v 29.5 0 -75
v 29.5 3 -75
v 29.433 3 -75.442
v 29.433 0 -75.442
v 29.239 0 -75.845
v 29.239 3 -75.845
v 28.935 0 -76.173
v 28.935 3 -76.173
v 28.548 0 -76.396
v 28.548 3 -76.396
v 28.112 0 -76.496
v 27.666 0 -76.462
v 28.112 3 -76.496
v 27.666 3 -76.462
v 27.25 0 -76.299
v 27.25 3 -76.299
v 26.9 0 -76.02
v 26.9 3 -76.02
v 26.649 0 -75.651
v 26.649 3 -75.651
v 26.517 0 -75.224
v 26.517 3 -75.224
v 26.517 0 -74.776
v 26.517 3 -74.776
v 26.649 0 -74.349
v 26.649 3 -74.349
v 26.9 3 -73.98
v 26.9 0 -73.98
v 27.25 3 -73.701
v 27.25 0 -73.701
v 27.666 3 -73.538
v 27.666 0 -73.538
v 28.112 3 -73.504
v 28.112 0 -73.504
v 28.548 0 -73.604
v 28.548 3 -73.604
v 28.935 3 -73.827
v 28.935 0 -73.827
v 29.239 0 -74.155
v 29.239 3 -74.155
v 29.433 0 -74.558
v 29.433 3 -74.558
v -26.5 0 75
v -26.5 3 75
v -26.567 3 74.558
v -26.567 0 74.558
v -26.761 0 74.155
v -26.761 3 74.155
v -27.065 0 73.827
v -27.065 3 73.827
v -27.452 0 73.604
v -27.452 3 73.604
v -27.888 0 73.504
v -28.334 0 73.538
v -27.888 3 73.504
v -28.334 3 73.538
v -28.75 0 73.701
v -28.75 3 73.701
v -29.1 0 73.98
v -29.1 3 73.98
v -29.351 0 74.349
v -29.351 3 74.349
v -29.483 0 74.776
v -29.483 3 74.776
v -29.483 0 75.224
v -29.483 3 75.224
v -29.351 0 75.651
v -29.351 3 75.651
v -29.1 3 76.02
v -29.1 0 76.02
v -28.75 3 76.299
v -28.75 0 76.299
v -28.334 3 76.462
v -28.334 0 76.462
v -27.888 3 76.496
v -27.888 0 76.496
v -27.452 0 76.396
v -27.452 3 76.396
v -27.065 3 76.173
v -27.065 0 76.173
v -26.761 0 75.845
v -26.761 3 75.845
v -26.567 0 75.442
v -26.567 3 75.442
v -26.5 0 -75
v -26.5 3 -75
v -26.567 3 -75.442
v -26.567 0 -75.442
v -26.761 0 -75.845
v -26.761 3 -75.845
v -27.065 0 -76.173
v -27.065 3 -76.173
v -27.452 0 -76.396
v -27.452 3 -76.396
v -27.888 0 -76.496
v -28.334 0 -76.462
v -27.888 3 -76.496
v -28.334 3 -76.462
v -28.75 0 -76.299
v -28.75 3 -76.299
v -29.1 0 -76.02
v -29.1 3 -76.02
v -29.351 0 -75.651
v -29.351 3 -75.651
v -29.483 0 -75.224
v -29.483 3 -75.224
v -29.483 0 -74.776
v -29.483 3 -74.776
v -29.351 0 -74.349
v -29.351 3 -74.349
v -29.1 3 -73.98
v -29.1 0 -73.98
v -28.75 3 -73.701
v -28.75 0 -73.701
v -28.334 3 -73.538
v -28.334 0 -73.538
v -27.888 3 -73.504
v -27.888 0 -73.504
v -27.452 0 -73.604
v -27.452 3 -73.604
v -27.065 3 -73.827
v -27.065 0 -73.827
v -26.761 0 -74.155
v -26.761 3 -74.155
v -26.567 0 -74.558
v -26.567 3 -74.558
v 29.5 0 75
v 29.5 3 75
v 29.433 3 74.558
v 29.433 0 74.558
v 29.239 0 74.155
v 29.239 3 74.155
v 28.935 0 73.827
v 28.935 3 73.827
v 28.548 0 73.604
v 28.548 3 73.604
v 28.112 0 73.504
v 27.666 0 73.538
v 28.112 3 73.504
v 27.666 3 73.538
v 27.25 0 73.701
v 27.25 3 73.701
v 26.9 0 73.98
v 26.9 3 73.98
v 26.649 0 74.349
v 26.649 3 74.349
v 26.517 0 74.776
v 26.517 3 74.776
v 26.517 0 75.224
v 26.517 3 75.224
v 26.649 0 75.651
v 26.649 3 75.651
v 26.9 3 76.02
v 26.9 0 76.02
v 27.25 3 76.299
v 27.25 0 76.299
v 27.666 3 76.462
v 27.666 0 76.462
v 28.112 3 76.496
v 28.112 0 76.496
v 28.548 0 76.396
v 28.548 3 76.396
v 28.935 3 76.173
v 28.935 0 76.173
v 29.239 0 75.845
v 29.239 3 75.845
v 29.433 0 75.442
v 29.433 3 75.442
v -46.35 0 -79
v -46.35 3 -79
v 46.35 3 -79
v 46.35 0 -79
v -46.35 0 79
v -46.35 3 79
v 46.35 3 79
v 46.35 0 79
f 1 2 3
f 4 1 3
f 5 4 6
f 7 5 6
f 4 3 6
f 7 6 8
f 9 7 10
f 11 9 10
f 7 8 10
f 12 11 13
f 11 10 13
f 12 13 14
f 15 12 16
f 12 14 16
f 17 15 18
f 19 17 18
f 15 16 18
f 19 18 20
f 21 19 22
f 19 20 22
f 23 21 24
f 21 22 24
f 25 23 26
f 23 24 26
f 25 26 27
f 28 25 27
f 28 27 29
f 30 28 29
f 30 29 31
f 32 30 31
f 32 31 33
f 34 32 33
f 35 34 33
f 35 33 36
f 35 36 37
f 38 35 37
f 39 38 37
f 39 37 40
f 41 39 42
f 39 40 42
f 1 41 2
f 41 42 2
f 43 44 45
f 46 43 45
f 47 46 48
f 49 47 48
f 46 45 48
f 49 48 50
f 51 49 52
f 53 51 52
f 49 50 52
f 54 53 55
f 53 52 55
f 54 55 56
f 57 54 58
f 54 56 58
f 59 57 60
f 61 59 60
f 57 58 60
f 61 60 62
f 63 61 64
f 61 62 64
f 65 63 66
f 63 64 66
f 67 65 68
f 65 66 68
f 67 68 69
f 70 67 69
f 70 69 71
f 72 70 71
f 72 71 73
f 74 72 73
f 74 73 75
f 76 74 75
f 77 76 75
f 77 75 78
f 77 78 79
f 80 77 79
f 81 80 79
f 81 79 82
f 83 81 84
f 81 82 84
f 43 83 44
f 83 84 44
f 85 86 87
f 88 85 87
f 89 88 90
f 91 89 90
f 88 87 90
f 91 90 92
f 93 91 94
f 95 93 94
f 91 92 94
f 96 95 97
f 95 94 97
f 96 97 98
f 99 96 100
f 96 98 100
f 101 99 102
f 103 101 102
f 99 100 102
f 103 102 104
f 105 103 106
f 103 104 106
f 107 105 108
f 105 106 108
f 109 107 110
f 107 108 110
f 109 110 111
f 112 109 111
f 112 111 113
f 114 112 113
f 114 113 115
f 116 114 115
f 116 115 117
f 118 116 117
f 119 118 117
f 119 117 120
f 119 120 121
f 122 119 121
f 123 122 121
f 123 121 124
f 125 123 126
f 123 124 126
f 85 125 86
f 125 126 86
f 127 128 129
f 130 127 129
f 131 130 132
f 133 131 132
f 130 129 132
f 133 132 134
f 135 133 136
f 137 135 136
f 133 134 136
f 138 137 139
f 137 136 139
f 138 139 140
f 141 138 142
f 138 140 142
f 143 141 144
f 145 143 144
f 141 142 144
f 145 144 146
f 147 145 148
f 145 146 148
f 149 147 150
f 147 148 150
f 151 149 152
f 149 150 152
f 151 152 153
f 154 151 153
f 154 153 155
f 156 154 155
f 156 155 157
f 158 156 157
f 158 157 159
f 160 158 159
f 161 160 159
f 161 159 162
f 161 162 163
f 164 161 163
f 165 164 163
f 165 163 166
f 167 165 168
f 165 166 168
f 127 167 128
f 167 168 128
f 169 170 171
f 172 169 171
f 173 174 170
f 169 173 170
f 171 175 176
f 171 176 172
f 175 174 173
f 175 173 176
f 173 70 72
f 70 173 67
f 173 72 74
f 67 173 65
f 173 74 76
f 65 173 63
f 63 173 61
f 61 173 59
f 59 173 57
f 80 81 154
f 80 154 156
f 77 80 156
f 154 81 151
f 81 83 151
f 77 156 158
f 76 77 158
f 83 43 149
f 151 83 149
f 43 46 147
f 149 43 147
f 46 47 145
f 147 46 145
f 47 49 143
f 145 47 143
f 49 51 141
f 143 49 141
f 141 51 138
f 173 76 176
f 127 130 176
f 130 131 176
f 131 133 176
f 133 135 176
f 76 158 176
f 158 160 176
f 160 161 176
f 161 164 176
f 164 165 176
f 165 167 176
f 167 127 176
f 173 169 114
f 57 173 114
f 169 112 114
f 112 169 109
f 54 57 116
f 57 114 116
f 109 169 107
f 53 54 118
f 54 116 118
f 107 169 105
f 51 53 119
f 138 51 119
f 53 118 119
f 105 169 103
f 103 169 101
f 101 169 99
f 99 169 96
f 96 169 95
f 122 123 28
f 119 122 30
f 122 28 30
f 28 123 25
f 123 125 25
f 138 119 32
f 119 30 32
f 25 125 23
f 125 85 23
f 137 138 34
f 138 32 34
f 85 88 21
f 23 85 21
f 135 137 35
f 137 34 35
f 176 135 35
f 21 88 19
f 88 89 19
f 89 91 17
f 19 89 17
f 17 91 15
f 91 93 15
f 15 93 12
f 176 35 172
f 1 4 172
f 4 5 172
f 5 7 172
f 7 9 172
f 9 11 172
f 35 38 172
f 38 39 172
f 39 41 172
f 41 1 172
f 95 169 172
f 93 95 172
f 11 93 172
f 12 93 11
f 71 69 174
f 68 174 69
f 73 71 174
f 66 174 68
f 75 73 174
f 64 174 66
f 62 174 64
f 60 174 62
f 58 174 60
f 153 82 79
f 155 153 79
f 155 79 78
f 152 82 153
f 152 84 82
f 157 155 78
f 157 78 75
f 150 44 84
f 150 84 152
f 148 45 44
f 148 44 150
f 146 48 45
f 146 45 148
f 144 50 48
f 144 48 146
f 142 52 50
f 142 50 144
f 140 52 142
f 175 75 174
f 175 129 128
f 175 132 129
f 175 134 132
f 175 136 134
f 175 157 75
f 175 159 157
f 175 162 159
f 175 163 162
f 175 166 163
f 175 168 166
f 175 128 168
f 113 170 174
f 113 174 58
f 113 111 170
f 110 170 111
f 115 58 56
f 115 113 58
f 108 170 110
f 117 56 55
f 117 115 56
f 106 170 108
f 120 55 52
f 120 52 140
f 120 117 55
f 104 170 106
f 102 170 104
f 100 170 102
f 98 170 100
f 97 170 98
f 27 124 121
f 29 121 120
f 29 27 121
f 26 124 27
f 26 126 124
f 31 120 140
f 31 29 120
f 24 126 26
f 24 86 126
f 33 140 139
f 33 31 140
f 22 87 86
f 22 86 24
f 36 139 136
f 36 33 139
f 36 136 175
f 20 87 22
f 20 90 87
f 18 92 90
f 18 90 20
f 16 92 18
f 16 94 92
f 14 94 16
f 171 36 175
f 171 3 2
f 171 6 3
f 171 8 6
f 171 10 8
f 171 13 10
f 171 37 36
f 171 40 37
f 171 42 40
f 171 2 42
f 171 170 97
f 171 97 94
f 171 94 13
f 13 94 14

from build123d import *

# Parameters (mm, degrees)
SKETCH1_W           = 92.7
SKETCH1_H           = 158
SKETCH1_R           = 1.5
BOSS_EXTRUDE1_DEPTH = 3


with BuildPart() as part:
    # Sketch1 → Boss-Extrude1 (new body)
    with BuildSketch(Plane(origin=(0, 3, 0), x_dir=(1, 0, 0), z_dir=(0, 1, 0))):
        Rectangle(SKETCH1_W, SKETCH1_H)
        with Locations((28, -75)):
            Circle(SKETCH1_R, mode=Mode.SUBTRACT)
        with Locations((28, 75)):
            Circle(SKETCH1_R, mode=Mode.SUBTRACT)
        with Locations((-28, 75)):
            Circle(SKETCH1_R, mode=Mode.SUBTRACT)
        with Locations((-28, -75)):
            Circle(SKETCH1_R, mode=Mode.SUBTRACT)
    extrude(amount=-BOSS_EXTRUDE1_DEPTH)


solid = part.part
